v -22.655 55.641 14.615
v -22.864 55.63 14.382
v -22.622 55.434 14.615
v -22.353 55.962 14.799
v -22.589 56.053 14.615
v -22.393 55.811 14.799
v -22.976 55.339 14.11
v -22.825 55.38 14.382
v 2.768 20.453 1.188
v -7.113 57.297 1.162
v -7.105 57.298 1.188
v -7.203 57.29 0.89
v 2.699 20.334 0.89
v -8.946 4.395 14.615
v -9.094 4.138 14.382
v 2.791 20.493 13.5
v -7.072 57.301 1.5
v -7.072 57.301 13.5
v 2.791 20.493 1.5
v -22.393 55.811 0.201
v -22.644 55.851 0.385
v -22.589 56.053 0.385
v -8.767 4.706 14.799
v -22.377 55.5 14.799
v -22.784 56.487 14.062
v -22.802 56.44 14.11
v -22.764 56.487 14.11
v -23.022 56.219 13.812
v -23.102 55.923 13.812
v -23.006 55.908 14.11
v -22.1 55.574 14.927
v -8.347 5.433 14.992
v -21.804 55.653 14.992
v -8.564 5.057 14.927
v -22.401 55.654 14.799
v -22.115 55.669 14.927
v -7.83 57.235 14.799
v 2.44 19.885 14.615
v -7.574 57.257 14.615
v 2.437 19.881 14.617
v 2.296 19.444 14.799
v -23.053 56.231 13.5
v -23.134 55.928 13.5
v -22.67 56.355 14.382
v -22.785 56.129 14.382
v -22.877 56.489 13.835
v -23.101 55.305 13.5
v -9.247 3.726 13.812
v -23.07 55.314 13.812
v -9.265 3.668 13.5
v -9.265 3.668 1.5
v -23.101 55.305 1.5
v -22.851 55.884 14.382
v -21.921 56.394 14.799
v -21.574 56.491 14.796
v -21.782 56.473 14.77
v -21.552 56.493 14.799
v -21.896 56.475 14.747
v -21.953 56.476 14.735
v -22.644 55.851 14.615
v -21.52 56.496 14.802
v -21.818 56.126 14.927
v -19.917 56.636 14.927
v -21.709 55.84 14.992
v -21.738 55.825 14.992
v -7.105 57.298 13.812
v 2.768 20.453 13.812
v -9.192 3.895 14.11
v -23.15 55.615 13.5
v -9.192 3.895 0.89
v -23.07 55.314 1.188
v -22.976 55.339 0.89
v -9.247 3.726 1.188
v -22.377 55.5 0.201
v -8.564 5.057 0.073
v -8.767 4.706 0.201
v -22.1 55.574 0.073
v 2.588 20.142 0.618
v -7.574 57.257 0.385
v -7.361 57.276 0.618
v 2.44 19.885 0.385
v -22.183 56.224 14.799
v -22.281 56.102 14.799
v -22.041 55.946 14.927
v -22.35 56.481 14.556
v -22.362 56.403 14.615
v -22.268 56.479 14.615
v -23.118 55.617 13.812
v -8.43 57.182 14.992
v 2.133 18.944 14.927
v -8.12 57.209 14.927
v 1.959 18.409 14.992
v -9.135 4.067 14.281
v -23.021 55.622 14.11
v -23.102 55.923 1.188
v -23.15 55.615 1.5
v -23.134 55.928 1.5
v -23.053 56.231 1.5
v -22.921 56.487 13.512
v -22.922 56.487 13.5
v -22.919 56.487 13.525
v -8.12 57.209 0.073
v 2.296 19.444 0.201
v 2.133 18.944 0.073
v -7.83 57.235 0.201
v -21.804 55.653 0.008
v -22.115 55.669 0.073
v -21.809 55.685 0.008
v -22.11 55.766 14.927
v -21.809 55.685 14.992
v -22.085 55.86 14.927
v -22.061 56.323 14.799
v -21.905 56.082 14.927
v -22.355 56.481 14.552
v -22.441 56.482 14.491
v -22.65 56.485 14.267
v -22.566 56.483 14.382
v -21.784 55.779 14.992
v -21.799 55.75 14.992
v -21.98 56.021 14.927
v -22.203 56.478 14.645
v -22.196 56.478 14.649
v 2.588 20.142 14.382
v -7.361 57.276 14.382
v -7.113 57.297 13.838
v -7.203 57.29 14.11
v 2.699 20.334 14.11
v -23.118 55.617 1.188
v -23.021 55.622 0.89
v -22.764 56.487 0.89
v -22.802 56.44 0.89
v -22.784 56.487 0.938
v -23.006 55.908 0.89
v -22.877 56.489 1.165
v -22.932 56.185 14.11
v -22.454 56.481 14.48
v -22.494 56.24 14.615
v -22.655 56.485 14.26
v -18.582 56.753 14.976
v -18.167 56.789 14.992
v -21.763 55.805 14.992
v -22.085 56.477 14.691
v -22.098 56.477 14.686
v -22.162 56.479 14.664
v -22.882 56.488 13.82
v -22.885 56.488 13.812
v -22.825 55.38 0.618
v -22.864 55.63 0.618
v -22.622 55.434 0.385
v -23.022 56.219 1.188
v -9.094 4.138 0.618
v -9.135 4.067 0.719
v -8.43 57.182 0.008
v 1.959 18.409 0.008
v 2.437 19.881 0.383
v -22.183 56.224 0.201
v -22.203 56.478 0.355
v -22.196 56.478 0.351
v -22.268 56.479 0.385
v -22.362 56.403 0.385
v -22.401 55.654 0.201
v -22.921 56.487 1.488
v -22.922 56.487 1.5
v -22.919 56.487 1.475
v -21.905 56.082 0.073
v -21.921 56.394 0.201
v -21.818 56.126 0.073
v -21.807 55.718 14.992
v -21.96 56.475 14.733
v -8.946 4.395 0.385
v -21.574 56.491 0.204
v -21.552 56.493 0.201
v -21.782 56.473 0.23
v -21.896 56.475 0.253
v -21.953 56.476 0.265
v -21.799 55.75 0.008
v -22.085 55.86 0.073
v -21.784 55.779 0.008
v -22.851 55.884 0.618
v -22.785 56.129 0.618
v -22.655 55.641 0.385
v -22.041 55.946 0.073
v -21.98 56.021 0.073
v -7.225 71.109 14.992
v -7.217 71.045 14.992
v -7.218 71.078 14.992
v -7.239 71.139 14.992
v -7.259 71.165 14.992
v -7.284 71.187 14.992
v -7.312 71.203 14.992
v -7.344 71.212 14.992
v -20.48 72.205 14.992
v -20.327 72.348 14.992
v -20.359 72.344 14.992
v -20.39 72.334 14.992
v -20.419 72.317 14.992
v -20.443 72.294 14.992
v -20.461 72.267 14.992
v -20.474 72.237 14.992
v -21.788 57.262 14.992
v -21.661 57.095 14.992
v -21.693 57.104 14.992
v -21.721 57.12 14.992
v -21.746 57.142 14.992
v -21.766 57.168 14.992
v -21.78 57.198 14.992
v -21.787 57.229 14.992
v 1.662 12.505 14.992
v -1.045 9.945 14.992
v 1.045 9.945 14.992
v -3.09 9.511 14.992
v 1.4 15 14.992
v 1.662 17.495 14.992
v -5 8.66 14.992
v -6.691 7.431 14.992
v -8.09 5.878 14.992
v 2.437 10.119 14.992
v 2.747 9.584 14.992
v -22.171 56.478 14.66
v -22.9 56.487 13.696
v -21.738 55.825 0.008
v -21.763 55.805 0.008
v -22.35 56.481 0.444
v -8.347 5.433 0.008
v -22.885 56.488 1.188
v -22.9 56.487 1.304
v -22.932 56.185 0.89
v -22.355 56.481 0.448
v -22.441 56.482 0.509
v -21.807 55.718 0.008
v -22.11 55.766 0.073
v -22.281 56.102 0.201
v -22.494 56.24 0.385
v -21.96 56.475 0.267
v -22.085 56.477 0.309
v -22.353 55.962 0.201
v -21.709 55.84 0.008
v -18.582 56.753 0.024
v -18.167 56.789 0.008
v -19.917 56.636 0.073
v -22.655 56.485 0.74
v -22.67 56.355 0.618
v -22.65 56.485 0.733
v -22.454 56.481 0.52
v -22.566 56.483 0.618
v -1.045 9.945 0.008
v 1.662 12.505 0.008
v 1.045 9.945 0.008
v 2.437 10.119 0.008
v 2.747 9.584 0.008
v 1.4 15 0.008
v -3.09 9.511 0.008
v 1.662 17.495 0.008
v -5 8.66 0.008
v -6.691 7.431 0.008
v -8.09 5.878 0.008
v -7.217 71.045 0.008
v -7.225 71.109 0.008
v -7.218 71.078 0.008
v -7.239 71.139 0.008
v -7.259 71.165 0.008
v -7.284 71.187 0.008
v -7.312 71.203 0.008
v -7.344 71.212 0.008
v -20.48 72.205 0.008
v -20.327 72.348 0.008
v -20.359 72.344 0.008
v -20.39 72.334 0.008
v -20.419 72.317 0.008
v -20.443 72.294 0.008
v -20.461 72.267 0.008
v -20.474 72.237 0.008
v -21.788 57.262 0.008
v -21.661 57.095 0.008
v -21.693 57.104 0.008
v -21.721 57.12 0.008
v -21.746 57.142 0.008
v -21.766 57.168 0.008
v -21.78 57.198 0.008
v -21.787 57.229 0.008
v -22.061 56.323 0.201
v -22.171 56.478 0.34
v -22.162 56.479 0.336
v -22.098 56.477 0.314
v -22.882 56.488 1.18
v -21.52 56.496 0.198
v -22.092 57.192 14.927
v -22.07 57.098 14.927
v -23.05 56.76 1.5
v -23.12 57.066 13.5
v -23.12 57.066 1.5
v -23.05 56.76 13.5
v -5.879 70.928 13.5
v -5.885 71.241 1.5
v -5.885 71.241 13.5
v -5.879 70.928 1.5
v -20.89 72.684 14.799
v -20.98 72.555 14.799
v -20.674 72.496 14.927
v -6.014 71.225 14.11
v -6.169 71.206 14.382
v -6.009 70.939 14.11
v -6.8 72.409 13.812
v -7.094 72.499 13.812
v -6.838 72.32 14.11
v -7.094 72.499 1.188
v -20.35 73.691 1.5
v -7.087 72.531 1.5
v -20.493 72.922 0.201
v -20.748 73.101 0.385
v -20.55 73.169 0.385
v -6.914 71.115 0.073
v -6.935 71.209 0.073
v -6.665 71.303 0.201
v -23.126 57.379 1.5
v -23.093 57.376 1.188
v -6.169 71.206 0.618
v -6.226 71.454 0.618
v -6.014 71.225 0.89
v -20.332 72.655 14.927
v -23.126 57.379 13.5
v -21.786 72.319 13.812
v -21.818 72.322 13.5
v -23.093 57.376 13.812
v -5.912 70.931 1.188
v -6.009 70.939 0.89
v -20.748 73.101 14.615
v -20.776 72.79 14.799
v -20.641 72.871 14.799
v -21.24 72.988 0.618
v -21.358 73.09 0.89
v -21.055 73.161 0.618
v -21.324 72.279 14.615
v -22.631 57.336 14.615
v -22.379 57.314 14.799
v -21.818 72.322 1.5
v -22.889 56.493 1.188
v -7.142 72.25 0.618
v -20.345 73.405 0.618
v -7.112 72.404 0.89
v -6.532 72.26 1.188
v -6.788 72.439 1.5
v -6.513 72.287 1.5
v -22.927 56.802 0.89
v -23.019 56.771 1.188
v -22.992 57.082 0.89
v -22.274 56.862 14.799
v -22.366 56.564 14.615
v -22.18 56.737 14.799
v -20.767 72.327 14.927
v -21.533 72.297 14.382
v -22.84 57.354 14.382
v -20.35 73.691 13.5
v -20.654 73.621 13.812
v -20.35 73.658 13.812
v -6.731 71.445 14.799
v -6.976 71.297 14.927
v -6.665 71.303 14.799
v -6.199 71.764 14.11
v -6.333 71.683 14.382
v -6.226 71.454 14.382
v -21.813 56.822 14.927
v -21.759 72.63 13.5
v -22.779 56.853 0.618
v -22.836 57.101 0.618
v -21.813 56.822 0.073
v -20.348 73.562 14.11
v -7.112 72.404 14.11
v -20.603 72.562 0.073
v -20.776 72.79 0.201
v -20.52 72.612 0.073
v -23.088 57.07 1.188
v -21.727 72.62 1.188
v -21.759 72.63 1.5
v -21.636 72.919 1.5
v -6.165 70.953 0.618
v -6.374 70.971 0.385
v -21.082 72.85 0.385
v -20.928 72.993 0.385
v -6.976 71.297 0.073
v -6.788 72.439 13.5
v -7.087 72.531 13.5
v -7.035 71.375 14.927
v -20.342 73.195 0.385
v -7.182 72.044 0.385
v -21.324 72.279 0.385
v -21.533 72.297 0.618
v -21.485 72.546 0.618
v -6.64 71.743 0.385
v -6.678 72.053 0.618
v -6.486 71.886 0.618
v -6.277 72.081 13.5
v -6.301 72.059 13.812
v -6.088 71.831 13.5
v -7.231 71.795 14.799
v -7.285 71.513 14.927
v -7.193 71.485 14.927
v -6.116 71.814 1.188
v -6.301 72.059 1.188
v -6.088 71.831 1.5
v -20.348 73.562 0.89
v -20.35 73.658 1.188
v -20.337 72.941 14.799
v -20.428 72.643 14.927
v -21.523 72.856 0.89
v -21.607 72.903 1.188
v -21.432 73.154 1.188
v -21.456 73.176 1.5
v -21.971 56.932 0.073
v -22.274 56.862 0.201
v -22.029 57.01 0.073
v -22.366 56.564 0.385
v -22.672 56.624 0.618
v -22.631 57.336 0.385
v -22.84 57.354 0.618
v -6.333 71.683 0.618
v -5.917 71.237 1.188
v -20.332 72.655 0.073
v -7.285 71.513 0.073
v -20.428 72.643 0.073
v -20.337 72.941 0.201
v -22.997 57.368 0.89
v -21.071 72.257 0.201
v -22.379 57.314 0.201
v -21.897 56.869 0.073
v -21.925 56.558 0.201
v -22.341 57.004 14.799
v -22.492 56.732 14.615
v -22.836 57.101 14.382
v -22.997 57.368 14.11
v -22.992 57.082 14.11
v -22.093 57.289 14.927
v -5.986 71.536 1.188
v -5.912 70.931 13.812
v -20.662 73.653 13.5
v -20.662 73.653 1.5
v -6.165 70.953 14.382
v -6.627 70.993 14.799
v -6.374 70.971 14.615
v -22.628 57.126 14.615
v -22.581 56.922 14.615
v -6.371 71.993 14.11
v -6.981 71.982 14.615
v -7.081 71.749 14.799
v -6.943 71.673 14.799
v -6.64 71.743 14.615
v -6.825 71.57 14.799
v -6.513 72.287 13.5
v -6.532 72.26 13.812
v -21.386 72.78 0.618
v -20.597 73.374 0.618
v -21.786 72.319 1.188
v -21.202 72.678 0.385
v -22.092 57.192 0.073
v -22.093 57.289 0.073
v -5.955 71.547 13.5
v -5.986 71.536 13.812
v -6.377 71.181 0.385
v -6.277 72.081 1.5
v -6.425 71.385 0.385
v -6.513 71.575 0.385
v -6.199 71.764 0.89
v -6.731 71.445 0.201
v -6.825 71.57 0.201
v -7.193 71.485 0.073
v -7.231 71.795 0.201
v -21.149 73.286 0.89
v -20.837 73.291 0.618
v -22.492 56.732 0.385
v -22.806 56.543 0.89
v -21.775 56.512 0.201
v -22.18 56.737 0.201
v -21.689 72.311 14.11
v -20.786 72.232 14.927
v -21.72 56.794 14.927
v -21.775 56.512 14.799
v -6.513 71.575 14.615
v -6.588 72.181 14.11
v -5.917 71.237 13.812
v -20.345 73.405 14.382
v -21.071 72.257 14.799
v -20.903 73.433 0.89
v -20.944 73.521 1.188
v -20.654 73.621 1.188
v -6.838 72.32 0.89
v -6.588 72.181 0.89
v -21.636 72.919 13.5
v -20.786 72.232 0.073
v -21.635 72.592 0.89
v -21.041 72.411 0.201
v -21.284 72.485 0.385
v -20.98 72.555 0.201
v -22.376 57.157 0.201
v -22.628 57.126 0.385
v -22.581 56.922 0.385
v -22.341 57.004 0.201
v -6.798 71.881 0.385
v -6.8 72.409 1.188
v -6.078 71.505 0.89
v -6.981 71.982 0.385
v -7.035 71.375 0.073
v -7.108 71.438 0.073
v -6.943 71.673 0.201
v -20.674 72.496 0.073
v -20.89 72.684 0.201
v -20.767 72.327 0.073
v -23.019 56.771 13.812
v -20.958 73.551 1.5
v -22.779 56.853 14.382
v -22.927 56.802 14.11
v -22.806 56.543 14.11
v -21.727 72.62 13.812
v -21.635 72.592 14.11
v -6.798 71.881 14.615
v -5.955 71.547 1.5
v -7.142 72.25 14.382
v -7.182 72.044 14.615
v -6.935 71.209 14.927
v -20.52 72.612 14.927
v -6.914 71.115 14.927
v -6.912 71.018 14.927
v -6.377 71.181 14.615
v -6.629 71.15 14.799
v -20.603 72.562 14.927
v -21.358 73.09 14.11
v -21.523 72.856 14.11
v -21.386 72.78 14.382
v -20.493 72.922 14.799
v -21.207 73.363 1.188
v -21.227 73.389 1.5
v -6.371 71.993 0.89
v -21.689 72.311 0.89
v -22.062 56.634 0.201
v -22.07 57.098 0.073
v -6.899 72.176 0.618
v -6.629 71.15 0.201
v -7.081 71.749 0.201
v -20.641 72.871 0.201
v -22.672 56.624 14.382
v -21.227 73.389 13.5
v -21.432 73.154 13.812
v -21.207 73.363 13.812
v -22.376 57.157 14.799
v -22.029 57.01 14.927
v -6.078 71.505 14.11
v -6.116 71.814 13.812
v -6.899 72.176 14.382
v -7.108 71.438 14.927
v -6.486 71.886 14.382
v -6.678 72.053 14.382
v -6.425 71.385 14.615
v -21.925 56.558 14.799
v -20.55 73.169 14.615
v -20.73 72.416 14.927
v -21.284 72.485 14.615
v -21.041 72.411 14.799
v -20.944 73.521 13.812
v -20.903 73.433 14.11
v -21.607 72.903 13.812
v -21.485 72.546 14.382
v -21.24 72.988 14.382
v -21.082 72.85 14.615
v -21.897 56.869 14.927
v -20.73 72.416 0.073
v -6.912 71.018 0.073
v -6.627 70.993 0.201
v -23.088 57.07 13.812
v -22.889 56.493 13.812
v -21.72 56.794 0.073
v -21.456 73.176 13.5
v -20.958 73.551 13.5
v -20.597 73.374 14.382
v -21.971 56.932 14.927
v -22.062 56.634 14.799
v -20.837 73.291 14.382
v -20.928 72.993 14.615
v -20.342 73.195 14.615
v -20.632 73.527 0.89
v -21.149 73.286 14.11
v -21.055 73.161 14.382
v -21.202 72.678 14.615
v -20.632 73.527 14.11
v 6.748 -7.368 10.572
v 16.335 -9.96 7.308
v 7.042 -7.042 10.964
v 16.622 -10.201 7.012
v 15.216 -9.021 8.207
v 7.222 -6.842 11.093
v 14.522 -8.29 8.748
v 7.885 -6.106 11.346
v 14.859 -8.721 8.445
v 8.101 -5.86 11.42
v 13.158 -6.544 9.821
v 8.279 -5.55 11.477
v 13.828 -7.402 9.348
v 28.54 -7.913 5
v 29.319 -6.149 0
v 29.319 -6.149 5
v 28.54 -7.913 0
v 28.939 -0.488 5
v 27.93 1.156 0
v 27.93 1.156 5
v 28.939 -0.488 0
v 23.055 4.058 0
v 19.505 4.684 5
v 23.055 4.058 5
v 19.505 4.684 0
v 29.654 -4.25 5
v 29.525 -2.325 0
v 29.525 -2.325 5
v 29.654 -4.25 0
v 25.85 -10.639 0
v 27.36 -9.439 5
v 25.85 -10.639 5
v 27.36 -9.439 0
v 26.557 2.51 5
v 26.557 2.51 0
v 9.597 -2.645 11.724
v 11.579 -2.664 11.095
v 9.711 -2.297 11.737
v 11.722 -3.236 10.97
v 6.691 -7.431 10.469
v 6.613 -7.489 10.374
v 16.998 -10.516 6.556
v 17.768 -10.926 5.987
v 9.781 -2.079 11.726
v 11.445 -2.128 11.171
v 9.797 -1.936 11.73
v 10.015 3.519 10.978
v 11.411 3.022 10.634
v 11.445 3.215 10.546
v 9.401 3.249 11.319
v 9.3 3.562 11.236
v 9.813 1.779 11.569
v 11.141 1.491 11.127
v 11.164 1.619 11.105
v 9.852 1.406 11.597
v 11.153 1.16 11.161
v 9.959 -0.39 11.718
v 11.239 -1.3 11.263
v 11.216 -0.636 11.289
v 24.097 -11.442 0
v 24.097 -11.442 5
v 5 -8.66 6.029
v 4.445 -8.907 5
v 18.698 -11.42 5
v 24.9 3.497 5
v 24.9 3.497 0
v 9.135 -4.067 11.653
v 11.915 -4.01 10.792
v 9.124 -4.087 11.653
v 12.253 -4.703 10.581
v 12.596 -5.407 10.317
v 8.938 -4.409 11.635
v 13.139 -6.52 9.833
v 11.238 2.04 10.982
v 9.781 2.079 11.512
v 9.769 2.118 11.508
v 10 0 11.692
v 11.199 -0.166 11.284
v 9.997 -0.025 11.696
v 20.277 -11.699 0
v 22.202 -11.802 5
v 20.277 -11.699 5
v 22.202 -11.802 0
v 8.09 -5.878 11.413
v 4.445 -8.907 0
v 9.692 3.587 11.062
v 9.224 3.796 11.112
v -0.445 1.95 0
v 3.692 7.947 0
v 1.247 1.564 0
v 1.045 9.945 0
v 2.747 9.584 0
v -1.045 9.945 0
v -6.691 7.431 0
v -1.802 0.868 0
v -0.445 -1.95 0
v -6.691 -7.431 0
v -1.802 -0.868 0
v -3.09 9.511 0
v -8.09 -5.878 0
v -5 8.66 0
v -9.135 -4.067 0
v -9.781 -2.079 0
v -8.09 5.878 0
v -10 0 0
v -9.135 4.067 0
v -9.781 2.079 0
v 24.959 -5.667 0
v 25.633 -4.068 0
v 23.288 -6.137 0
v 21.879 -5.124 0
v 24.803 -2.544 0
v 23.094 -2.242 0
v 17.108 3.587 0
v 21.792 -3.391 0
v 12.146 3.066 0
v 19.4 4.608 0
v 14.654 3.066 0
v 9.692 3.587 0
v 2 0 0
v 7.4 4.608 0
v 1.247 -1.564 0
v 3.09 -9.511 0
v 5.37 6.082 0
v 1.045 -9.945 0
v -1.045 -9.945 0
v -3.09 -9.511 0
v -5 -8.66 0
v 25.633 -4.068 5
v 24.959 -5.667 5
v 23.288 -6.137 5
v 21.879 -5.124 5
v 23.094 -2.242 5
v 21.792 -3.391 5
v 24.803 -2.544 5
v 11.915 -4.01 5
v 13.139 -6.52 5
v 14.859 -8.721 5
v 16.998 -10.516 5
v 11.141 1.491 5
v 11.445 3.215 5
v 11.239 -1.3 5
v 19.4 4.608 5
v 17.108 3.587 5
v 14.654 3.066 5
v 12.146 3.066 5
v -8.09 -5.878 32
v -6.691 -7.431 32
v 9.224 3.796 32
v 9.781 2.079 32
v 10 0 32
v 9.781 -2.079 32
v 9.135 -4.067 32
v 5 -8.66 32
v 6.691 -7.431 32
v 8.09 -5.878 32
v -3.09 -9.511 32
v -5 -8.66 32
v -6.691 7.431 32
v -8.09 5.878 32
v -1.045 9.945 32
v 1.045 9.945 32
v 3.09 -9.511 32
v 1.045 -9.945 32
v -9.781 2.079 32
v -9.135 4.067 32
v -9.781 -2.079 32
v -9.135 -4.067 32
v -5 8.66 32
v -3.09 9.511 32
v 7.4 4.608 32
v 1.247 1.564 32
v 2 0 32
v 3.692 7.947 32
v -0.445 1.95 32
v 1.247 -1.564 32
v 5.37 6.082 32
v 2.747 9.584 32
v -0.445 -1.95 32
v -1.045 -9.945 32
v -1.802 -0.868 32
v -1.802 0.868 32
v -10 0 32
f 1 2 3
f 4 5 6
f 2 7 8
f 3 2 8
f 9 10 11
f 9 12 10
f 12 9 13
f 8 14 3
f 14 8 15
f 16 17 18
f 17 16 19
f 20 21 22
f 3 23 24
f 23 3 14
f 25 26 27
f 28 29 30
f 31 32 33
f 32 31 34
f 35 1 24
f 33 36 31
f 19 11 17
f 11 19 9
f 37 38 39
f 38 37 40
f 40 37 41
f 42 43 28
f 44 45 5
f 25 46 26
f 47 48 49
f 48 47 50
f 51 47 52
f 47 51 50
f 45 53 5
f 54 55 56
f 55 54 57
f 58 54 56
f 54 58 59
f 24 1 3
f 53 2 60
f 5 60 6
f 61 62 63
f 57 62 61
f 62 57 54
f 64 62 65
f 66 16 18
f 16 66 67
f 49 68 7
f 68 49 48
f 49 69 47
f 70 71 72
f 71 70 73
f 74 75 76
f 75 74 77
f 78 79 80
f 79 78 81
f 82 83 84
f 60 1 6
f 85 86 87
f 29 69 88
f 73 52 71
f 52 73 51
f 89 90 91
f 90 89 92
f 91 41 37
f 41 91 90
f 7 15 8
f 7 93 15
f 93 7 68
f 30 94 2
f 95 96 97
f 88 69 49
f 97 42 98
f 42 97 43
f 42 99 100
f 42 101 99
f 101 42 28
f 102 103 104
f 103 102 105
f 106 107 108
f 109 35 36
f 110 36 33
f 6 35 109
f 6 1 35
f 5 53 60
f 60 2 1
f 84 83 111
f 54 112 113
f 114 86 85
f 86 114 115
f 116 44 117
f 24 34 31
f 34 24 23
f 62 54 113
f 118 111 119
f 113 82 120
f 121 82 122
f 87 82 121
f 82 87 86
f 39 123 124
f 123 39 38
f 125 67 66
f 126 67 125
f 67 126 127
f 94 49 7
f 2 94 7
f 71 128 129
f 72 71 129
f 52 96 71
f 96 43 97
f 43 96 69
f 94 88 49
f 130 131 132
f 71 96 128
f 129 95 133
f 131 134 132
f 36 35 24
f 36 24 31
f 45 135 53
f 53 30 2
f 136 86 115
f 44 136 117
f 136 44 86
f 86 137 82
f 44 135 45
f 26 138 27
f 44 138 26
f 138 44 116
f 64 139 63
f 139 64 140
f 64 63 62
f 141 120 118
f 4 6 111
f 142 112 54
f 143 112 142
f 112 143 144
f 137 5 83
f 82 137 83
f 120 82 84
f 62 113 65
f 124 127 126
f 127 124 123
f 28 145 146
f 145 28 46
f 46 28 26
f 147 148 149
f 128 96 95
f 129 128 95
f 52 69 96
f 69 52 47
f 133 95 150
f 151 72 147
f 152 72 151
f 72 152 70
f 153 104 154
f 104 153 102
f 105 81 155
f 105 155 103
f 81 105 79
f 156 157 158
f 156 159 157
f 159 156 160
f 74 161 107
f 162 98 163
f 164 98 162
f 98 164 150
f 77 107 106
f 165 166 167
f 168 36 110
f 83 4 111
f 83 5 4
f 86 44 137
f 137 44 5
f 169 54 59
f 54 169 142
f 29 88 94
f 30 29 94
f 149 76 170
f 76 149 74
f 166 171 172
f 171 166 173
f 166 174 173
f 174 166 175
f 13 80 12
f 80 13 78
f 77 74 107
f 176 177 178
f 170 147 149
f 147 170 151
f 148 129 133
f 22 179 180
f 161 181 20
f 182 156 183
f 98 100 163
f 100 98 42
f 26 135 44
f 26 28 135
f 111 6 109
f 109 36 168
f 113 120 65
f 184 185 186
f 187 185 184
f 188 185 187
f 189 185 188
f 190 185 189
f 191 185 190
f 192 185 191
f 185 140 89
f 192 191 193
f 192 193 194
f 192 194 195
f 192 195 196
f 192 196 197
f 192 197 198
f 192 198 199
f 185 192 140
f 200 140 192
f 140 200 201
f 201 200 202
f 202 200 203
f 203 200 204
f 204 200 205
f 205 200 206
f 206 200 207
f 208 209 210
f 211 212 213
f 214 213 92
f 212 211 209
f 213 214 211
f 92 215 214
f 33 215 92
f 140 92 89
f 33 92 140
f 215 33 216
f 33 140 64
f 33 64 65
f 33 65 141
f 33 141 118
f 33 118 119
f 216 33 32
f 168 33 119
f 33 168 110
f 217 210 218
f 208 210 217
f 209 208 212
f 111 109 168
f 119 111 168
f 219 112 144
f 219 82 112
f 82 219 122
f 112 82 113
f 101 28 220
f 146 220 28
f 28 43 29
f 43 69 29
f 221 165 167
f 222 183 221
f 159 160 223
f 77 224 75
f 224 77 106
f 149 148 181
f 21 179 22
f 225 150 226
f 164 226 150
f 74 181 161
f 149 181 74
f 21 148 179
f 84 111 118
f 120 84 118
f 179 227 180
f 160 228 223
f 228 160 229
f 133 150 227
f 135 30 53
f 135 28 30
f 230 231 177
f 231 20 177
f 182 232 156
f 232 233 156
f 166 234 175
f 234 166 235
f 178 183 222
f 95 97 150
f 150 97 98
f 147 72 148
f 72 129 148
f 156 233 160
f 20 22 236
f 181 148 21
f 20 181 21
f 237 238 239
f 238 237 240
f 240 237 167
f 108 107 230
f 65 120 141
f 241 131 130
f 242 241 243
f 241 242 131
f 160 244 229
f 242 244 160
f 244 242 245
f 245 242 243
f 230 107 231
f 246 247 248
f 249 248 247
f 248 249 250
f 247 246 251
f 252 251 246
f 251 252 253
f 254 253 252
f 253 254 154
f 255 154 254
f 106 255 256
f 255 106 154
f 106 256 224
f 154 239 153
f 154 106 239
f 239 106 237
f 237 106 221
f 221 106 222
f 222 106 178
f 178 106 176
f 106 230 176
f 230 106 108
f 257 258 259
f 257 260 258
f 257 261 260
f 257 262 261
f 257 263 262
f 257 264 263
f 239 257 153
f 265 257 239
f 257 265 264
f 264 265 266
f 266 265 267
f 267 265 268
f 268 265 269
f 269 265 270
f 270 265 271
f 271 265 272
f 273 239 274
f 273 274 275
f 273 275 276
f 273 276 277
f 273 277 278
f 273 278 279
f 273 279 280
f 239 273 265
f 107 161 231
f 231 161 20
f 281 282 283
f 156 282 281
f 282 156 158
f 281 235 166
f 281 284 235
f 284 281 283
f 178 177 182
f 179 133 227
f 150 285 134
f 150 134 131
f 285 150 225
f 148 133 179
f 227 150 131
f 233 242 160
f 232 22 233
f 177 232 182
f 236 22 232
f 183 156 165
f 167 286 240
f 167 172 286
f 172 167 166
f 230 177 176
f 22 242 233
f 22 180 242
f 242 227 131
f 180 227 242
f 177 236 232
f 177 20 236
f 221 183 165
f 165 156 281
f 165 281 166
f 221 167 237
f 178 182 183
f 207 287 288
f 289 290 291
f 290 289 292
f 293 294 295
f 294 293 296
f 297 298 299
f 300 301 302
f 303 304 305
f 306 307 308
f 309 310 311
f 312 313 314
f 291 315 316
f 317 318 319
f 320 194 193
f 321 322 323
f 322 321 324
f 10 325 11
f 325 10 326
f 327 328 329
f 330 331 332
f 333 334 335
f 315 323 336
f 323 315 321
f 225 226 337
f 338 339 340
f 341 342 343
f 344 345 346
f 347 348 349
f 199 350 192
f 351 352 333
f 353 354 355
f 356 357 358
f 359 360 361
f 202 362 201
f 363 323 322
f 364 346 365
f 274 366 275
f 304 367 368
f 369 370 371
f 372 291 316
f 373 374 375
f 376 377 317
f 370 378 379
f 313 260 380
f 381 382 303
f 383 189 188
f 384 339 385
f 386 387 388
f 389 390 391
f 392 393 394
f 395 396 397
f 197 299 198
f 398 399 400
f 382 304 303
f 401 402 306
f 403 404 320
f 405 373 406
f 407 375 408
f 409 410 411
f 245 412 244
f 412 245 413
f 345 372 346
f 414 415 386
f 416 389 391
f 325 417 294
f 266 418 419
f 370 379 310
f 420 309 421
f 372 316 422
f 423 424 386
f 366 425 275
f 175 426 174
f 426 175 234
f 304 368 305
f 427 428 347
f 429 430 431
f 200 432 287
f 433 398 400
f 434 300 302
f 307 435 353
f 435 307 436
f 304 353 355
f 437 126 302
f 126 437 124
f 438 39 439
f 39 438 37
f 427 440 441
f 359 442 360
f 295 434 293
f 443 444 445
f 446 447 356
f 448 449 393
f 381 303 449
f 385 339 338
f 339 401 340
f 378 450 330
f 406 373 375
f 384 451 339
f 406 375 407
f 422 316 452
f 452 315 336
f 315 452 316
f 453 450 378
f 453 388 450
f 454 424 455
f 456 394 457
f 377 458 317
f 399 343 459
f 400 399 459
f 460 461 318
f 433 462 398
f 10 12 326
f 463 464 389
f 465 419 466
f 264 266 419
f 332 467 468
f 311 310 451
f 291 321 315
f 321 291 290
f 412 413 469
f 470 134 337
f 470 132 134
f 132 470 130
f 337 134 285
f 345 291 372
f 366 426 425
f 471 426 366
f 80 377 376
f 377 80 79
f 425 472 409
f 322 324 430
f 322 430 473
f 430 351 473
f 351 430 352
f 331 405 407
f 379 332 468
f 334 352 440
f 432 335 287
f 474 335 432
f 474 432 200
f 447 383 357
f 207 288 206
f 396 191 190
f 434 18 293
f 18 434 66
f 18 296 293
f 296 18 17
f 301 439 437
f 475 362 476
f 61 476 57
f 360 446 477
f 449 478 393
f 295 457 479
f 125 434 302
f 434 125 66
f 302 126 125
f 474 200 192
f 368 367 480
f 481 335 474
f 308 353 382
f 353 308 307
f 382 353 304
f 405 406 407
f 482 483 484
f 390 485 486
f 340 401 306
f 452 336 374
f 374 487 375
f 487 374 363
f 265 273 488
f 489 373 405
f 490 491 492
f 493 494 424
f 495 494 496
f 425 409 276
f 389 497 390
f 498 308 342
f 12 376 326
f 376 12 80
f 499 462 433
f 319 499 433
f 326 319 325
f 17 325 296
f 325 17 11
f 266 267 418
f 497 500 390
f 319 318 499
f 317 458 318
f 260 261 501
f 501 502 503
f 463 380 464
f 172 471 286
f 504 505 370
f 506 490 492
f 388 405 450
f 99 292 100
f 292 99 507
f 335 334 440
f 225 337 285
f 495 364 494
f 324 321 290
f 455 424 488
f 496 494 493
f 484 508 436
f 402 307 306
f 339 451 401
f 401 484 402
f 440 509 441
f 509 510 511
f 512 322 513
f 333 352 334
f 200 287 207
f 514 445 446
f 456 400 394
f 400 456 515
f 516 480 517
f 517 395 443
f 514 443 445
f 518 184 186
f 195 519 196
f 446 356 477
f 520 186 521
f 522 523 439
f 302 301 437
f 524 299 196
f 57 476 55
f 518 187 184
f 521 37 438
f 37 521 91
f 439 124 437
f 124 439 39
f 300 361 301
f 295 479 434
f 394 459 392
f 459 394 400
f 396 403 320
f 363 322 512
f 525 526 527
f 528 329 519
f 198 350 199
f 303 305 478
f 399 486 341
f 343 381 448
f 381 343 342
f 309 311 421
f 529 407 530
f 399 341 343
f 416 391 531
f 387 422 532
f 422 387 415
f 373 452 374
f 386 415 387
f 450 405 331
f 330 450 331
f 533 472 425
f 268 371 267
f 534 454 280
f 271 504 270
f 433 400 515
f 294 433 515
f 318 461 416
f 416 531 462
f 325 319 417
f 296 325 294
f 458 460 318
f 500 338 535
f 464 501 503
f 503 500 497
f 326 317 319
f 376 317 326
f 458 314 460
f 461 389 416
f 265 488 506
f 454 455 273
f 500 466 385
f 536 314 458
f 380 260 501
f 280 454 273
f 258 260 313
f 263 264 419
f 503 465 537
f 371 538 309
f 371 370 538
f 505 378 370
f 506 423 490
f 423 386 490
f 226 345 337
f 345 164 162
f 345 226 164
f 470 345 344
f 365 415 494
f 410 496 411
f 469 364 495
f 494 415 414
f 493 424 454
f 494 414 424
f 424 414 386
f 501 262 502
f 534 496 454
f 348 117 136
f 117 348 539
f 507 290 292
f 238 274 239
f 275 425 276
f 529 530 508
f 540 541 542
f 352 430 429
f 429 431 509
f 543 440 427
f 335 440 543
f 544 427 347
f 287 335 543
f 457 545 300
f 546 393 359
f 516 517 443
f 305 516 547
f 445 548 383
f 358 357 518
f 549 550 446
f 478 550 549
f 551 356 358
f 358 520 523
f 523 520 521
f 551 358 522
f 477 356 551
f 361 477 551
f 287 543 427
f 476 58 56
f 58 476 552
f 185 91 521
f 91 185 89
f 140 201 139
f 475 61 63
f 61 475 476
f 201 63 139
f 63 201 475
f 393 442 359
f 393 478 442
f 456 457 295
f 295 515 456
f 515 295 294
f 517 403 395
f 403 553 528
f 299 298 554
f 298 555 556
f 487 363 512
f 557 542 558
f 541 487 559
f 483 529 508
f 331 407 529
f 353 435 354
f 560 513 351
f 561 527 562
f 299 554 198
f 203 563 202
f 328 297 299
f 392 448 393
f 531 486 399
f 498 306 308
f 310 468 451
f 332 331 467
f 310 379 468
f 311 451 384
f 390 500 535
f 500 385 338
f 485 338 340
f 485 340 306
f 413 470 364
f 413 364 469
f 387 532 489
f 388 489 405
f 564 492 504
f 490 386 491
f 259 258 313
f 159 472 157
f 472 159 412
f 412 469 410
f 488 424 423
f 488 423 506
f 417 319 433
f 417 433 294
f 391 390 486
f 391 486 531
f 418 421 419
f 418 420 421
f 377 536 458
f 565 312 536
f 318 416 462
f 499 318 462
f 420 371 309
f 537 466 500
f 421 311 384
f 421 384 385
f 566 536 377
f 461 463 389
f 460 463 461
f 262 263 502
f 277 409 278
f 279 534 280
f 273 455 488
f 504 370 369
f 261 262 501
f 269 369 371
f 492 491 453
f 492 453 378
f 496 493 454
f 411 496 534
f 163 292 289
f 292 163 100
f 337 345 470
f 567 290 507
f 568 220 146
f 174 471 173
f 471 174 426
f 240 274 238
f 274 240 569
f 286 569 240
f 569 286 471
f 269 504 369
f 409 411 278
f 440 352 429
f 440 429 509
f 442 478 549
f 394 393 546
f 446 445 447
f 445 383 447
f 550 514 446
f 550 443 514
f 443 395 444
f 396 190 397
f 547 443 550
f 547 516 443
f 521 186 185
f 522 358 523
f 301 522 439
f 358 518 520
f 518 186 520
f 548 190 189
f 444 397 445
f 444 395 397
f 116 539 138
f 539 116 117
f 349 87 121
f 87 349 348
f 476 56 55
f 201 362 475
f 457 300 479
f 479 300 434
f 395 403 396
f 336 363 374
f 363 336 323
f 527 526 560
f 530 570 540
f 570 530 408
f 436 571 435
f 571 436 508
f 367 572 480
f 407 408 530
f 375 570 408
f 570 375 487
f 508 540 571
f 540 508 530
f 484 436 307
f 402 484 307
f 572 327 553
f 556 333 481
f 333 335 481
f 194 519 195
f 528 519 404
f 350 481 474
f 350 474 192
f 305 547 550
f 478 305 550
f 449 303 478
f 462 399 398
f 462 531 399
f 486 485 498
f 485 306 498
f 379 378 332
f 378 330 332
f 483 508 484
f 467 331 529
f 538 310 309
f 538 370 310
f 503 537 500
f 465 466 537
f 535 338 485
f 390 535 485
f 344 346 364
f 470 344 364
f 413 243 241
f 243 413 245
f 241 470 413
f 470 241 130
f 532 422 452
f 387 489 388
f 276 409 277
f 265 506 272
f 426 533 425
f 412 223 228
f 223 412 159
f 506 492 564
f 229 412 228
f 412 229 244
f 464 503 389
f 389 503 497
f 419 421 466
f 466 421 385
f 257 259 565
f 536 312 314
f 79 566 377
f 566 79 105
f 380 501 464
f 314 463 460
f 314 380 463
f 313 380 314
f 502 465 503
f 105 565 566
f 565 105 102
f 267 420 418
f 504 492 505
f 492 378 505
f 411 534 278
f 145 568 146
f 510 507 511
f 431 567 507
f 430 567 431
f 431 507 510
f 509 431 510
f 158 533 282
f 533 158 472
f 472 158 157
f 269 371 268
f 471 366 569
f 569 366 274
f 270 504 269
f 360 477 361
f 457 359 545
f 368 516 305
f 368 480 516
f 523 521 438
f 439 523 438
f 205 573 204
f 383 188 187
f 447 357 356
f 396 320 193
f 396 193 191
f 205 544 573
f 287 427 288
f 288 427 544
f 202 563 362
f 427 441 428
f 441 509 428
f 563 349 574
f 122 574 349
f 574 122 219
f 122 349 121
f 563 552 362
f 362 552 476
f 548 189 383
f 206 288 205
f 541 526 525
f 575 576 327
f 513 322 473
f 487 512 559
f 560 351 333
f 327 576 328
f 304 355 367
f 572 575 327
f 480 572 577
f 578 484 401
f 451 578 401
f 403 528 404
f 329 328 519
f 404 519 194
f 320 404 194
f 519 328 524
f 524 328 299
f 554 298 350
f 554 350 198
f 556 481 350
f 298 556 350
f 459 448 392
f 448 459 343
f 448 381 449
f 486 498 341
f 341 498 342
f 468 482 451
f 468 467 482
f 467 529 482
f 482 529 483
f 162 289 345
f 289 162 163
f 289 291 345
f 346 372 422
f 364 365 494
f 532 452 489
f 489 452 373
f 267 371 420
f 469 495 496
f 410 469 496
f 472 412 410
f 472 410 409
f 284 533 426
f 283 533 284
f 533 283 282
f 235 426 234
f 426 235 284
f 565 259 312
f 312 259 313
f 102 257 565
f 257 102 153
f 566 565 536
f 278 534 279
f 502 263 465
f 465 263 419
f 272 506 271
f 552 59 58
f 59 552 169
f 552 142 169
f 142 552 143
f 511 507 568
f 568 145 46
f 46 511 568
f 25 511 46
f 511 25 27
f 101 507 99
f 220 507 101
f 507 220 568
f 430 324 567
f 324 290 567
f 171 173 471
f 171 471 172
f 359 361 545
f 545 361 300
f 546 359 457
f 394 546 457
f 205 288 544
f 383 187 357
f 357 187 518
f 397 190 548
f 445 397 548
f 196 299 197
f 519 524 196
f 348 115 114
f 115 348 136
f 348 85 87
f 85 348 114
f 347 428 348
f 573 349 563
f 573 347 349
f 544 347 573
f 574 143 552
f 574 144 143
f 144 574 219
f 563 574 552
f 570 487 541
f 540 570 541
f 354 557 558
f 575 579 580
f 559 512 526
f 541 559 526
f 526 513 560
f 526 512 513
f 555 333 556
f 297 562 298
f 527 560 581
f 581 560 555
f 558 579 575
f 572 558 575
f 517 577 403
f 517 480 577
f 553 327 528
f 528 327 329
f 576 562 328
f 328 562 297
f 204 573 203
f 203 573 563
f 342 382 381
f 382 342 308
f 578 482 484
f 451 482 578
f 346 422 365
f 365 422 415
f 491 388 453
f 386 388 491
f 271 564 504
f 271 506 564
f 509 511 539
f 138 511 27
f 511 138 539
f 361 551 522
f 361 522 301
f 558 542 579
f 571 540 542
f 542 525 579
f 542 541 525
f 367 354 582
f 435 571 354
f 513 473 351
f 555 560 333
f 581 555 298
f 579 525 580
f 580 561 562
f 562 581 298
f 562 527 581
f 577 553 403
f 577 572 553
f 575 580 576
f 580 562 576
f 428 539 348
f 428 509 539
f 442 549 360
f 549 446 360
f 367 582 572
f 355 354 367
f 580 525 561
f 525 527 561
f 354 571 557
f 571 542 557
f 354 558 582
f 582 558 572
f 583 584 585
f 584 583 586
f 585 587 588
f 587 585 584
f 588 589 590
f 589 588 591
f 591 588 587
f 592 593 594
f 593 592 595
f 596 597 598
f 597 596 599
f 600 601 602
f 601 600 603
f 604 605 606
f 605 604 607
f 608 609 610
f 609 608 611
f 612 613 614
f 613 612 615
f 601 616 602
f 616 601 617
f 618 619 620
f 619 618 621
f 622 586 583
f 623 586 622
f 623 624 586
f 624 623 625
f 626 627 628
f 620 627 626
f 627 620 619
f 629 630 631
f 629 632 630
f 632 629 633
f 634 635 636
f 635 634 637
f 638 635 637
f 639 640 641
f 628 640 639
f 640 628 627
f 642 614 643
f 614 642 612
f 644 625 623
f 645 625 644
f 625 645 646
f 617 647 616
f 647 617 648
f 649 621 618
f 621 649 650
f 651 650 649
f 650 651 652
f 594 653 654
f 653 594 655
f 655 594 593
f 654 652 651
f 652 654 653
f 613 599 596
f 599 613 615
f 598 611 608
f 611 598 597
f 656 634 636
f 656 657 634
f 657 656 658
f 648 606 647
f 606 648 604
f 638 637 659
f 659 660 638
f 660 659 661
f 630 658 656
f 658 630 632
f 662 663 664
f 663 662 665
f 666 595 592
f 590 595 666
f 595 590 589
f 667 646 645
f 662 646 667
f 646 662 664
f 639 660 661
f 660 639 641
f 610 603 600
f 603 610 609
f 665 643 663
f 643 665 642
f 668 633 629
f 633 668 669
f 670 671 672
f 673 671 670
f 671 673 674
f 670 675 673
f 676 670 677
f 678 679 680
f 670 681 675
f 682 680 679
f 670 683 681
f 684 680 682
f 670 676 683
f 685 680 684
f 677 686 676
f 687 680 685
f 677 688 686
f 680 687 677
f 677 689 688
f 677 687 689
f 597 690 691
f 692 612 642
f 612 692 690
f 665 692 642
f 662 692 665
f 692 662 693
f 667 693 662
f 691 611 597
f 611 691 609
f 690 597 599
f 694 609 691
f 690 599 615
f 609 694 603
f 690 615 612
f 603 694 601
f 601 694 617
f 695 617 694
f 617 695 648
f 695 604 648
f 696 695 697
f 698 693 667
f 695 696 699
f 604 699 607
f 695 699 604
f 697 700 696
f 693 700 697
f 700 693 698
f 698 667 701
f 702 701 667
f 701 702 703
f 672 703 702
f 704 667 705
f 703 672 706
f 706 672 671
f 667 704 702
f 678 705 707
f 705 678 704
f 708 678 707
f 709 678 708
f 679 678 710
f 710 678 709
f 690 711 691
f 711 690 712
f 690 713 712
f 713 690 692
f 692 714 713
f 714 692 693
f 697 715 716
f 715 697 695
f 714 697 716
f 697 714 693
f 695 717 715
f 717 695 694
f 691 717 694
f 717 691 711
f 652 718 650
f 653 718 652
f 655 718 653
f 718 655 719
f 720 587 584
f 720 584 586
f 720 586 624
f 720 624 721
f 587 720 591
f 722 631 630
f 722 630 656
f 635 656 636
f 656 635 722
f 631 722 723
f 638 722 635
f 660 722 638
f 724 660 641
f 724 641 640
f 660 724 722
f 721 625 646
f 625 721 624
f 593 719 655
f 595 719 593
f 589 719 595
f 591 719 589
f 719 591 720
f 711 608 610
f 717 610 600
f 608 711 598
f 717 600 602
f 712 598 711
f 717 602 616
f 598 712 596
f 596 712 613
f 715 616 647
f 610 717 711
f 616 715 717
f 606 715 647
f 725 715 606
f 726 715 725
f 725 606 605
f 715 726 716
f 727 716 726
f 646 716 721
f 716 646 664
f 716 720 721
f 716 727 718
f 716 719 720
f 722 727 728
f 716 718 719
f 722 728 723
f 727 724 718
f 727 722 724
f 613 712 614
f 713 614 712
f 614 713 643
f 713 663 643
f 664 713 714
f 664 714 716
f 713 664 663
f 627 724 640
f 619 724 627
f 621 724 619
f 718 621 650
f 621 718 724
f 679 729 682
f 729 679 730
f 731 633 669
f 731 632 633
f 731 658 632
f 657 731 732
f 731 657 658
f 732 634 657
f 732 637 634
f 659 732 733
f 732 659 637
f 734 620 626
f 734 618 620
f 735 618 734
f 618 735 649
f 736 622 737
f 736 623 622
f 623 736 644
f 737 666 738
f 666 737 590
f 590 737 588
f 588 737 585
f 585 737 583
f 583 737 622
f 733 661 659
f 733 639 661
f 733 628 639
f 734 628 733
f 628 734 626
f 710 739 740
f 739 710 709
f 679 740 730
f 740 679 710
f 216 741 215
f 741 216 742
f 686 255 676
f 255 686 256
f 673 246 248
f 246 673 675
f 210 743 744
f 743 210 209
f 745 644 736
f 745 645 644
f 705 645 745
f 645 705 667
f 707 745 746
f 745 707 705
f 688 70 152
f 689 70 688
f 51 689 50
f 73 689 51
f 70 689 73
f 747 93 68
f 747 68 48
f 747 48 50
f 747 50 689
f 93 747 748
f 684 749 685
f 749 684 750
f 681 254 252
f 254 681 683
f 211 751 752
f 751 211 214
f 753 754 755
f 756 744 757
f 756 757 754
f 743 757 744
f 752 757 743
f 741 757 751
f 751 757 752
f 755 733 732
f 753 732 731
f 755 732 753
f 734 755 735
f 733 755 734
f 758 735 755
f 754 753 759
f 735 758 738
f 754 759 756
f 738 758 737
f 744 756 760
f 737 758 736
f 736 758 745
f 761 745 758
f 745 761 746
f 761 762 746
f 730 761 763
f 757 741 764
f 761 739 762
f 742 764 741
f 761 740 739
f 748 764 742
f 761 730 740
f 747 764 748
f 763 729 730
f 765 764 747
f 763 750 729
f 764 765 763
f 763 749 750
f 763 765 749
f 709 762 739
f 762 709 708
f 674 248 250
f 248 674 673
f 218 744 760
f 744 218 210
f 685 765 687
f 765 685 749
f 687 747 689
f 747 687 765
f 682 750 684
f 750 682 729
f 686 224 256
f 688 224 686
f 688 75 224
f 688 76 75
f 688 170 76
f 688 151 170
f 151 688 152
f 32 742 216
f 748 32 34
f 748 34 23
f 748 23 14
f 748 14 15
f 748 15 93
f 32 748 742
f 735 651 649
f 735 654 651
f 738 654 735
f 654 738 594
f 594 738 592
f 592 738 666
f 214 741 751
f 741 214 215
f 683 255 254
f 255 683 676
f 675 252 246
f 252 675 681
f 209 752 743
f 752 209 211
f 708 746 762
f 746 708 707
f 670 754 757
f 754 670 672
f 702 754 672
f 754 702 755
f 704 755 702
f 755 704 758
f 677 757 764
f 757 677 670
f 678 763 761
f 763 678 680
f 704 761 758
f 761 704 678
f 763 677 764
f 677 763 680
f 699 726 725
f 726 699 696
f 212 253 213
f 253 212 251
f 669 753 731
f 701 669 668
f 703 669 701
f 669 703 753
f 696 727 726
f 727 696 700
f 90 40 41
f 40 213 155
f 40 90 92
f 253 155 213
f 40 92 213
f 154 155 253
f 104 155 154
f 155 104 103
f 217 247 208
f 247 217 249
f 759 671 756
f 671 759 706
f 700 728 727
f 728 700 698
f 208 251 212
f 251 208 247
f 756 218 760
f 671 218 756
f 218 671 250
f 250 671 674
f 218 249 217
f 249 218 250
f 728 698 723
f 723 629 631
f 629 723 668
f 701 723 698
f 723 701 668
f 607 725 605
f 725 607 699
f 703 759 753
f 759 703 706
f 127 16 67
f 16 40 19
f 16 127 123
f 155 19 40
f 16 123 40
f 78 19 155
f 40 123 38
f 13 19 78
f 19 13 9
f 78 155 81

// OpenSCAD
include<lib.scad>

baril_ext_d=20;
baril_ext_h=32;
baril_int_d=10.5;
baril_int_h=20;
baril_axis_d=4;
base_h=5;
pull_w=baril_ext_d*0.8;
pull_l=60;
pull_h=base_h*3;
drag_w=baril_ext_d*0.8;
drag_l=30;
drag_h=base_h;
drag_axis_d=4;


module poignee() {
    difference() {
        union() {
            cylinder(d=baril_ext_d, h=baril_ext_h);
            rotate([0,0,15]) union() {
                translate([-pull_w/2,0,0]) 
                    hull_box(pull_w,pull_l*1.015,pull_h,1.5,center=false);
                translate([-pull_w/2,pull_l,0]) 
					rotate([0,0,340])
                    hull_box(pull_w,pull_l * 0.3,pull_h,1.5,center=false);
				}
            rotate([0,0,260])
                translate([-drag_w/2,0,0]) 
                difference() {
					hull() {
						cube([drag_w,drag_l-drag_w/2,drag_h]);
						translate([drag_w/2,drag_l-drag_w/2,0])
							cylinder(d=drag_w, h=drag_h);
						translate([drag_w/2,0,0])
							cylinder(d=baril_int_d, h=baril_int_h*2/3);
					}
                    translate([drag_w/2,drag_l*0.8,-base_h*0.1]) 
                        cylinder(d=drag_axis_d, h=base_h*1.5);
                    translate([drag_w*0.2,drag_l*0.8,base_h]) 
                        cylinder(d=drag_w*1.67, h=base_h*2);
                } 
        }
        translate([0,0,-baril_ext_h*0.1])
            cylinder(d=baril_axis_d, h=baril_ext_h*1.2);
		translate([baril_ext_d*0.67,baril_ext_d*0.75,-1])
            cylinder(d=baril_ext_d*1.2, h=baril_ext_h+2);

    }
}

poignee();
